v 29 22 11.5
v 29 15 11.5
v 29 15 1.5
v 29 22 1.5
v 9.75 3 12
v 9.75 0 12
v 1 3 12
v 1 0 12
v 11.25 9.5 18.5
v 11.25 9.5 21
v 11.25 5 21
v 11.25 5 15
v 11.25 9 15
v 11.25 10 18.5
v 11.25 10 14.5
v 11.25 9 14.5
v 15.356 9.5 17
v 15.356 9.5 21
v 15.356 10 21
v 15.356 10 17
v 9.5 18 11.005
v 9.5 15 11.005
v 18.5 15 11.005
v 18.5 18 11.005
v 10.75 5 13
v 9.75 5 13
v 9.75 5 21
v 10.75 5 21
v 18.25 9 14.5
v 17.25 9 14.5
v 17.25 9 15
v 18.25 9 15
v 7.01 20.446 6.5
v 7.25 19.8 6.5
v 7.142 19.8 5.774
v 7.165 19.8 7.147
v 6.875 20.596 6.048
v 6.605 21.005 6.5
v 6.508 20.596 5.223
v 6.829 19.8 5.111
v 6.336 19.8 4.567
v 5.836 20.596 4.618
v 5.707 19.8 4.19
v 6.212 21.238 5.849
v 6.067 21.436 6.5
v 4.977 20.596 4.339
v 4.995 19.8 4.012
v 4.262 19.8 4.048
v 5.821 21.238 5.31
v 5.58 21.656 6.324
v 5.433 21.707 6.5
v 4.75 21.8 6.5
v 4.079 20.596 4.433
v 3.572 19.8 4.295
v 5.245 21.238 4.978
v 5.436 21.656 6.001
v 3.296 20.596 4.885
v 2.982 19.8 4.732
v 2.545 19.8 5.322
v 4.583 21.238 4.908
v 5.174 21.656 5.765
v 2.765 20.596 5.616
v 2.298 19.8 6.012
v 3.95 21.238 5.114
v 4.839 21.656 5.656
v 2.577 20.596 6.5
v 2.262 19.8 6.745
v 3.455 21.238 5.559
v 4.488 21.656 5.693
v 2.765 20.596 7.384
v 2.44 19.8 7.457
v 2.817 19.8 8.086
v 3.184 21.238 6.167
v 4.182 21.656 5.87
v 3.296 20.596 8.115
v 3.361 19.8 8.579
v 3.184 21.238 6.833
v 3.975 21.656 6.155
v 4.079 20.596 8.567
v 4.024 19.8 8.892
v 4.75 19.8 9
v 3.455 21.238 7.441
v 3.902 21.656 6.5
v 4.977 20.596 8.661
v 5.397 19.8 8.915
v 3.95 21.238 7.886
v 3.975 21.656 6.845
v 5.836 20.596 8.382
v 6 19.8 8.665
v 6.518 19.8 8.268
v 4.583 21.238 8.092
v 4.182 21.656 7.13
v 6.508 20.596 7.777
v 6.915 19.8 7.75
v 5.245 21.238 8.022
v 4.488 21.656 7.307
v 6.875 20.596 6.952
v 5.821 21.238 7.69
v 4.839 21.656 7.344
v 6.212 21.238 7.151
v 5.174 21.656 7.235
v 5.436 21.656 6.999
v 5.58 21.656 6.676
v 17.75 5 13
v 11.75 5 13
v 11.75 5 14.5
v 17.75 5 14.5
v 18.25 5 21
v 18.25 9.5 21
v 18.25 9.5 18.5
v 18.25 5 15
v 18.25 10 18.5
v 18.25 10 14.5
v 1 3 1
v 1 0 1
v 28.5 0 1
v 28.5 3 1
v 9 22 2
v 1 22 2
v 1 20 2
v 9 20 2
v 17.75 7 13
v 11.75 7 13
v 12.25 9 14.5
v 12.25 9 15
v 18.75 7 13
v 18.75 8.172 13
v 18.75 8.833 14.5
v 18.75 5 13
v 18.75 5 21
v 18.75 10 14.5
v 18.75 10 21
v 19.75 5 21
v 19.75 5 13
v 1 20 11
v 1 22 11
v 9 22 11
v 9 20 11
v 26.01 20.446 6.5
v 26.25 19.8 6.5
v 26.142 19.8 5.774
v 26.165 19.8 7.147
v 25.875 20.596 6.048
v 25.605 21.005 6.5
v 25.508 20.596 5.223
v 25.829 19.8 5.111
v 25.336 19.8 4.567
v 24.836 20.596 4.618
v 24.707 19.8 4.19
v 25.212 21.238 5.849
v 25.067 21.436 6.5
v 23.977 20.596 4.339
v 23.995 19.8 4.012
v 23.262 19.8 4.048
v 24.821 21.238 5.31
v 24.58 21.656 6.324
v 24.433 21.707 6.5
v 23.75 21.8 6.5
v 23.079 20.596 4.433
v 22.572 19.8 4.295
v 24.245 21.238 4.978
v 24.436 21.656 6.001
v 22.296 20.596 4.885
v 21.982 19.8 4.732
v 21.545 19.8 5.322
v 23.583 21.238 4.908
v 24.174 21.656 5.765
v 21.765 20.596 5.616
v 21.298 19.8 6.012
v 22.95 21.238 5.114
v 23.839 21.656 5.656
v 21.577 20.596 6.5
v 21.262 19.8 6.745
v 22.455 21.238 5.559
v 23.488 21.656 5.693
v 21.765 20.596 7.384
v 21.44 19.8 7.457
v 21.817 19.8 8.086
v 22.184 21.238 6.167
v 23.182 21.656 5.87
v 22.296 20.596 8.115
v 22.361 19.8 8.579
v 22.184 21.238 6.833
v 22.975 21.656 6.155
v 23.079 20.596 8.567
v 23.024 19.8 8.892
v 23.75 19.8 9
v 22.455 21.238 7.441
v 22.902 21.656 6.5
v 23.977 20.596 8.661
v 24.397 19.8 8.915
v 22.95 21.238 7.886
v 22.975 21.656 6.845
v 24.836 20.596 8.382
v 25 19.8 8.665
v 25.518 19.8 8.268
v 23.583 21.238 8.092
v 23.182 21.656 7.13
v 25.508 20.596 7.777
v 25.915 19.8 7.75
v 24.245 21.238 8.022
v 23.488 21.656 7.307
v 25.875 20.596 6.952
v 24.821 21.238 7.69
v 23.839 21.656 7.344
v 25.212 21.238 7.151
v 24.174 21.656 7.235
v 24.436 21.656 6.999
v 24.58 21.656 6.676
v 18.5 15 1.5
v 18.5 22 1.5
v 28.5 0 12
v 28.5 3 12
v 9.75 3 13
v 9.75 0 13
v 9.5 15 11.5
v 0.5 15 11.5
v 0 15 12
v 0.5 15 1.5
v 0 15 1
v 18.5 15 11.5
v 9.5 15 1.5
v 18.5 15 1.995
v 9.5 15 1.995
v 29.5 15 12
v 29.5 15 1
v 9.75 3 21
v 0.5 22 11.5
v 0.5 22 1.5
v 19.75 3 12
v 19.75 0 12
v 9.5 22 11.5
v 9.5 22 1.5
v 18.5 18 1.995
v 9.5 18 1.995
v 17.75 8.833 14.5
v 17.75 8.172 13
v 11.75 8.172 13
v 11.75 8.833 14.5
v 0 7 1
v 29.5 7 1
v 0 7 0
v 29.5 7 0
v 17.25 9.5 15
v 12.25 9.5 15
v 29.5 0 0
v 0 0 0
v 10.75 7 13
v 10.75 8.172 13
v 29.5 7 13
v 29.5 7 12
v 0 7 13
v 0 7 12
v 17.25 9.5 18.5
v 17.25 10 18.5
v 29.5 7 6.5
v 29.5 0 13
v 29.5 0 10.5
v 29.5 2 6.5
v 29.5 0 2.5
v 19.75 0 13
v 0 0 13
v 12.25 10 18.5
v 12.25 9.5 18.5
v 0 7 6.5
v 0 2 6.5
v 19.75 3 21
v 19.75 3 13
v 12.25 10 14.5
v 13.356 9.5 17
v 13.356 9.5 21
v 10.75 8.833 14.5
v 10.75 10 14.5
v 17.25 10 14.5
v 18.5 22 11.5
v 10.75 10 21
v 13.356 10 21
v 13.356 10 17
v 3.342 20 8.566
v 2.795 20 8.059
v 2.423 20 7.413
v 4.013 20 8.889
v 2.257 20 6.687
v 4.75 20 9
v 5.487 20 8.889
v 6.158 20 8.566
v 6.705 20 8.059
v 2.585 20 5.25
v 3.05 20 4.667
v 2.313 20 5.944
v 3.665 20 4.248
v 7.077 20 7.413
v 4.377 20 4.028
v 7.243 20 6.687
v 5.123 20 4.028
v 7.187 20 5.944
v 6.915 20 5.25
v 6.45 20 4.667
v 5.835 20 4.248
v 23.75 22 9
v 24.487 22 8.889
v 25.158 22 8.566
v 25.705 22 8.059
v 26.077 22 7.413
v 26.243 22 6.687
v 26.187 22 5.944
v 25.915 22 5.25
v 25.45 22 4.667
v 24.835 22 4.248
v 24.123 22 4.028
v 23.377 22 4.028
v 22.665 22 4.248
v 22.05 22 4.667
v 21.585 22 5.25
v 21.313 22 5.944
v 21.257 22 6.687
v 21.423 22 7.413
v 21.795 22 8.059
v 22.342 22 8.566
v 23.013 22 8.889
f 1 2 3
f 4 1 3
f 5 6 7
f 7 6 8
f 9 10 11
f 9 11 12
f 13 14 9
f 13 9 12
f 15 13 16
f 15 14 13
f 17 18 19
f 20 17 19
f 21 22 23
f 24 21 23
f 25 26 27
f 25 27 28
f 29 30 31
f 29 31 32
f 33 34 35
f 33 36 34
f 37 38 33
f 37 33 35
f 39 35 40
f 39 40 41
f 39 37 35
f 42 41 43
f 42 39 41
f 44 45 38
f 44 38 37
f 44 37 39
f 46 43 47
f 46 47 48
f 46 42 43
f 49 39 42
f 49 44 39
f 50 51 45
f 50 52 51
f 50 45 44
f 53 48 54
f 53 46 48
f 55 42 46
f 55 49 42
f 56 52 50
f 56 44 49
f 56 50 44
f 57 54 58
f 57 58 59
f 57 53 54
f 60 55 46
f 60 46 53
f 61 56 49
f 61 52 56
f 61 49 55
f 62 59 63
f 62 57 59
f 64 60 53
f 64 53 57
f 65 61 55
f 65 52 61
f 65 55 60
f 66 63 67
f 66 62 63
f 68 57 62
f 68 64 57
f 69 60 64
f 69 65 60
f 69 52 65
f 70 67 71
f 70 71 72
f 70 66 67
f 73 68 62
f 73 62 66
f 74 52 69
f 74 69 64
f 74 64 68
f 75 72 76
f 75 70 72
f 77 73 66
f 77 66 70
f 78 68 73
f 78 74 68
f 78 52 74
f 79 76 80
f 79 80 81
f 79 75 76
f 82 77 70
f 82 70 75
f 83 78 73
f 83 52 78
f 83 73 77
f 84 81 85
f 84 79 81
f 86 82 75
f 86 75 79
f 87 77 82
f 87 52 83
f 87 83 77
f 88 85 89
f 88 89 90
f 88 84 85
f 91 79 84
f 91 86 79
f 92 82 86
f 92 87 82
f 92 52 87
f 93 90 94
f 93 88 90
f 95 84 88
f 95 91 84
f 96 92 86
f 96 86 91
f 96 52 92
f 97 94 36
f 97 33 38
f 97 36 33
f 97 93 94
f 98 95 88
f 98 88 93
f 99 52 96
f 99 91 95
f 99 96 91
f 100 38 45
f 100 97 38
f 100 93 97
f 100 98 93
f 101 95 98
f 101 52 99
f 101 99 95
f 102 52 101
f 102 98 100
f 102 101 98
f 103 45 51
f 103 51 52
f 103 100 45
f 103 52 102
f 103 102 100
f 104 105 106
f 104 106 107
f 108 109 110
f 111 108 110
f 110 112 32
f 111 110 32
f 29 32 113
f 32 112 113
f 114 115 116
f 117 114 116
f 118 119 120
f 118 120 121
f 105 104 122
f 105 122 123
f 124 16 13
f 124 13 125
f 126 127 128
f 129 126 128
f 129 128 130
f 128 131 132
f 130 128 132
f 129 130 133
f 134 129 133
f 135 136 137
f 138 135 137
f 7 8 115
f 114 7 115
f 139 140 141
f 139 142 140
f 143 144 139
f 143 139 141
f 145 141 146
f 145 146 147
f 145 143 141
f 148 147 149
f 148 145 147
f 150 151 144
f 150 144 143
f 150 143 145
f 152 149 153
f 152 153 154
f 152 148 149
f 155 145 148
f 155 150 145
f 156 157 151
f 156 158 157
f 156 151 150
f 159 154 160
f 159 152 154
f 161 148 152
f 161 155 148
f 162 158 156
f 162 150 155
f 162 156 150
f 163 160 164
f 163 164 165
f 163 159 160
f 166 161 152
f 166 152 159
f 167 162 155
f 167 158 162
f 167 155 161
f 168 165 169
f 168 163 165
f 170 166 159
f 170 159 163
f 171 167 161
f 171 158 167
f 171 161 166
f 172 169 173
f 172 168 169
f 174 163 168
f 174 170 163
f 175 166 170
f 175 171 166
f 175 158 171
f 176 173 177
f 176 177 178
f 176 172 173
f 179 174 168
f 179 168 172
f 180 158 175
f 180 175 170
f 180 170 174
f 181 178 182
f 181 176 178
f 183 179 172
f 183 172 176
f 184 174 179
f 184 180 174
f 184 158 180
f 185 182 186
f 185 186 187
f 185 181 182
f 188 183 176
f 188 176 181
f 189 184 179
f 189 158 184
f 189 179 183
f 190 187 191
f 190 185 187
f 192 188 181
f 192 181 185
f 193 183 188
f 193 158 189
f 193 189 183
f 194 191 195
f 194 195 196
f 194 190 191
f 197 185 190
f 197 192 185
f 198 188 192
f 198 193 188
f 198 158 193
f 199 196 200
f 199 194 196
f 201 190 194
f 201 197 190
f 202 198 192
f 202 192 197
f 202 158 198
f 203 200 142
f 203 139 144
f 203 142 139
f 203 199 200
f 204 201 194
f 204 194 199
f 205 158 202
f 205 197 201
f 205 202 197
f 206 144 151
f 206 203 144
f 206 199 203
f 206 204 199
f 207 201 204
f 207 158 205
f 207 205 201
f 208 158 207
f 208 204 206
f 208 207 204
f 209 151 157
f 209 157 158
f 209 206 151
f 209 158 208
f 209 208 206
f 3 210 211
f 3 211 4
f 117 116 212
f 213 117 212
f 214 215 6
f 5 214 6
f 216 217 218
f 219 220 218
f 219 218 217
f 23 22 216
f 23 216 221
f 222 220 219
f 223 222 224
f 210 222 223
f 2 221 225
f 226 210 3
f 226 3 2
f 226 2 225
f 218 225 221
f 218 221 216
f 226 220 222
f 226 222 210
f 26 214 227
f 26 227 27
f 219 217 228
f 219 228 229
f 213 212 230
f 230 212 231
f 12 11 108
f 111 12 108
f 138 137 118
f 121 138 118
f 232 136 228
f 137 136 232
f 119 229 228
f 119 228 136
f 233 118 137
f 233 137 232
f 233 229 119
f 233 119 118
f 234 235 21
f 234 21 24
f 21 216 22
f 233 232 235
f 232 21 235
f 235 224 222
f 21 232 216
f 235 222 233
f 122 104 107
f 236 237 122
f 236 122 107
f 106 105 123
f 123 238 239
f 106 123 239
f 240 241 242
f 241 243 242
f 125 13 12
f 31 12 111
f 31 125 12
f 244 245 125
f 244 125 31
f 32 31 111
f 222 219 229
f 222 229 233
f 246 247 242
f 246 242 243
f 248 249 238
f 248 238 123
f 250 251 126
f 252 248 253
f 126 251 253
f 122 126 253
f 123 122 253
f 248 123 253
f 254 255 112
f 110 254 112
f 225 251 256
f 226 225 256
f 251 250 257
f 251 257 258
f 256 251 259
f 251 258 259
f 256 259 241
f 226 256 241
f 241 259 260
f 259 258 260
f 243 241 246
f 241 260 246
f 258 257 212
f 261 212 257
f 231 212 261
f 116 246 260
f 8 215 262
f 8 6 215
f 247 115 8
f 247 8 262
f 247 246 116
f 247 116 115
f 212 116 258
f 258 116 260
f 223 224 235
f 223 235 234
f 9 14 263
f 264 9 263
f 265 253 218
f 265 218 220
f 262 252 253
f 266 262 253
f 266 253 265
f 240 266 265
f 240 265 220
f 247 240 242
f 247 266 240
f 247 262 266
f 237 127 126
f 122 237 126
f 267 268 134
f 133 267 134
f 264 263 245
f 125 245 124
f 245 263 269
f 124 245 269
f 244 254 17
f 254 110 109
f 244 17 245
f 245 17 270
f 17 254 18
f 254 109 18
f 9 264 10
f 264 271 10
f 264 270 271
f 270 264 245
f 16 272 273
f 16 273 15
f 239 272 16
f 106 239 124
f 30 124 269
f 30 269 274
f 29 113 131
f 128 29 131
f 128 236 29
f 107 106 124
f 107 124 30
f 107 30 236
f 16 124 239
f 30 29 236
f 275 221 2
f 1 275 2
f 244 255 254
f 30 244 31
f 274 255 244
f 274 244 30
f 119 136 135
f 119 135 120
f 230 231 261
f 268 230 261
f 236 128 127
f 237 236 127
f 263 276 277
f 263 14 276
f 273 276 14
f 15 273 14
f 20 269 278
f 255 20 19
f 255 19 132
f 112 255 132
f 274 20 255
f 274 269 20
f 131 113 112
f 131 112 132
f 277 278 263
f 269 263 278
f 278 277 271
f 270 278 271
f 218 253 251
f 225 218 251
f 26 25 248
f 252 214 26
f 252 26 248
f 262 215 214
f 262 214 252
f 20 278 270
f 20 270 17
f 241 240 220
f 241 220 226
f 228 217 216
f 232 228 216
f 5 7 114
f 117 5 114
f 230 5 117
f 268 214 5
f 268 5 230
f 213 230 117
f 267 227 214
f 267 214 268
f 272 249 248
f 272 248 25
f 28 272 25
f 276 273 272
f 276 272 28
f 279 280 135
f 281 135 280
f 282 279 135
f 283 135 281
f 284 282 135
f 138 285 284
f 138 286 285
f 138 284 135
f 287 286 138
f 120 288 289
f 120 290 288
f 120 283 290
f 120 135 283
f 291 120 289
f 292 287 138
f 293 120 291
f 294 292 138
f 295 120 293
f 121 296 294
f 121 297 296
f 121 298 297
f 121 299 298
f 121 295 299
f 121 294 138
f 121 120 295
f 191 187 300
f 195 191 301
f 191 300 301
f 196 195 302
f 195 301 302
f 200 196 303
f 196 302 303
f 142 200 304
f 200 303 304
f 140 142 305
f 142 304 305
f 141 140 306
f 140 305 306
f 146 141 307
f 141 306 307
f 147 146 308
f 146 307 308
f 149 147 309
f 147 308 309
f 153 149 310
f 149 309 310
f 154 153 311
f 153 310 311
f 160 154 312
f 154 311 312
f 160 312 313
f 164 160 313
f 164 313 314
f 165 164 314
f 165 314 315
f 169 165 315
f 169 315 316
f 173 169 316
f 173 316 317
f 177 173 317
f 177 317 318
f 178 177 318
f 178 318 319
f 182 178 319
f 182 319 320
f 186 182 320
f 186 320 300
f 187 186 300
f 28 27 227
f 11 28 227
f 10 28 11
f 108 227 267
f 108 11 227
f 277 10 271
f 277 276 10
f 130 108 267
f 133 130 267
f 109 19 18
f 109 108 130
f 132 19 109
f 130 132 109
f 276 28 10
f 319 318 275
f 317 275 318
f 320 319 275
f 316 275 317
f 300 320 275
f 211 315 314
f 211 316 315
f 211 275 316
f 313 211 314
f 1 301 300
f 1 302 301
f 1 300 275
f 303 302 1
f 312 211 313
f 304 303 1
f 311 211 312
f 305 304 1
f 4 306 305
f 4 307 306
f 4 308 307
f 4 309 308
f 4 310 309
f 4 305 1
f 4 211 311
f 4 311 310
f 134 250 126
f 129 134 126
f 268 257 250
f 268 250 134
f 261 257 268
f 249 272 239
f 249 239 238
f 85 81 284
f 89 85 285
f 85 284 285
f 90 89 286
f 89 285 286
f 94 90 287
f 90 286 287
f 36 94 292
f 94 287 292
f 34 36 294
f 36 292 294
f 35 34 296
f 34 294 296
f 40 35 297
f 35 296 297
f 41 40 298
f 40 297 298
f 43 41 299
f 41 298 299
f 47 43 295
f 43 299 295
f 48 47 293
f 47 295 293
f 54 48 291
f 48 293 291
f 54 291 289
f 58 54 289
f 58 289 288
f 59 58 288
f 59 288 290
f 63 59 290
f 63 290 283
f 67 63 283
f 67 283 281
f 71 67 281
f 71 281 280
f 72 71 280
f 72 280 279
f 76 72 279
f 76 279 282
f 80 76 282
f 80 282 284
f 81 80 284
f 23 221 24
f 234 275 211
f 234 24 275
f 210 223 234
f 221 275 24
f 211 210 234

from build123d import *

# Parameters (mm, degrees)
EXTRUDE_1_DEPTH          = 7
CUT_EXTRUDE_START        = -5
SKETCH_2_R               = 4
CUT_EXTRUDE_1_DEPTH      = 5
SKETCH_3_W               = 29.5
SKETCH_3_H               = 11
EXTRUDE_2_DEPTH          = 8
SKETCH_4_W               = 10.5
SKETCH_4_H               = 10
SKETCH_4_W_2             = 9
EXTRUDE_3_DEPTH          = 7
SKETCH_5_W               = 8
SKETCH_5_H               = 9
CUT_EXTRUDE_2_DEPTH      = 2
SKETCH_6_R               = 2.5
CUT_EXTRUDE_3_DEPTH      = 2.2
SKETCH_7_R               = 1.6
CUT_EXTRUDE_4_DEPTH      = 45.443784717
SKETCH_8_W               = 10
SKETCH_8_H               = 5
EXTRUDE_4_DEPTH          = 8
CUT_EXTRUDE_5_DEPTH      = 3
SKETCH_11_W              = 8
SKETCH_11_H              = 6.5
EXTRUDE_6_DEPTH          = 5
EXTRUDE_7_DEPTH          = 1
EXTRUDE_8_DEPTH          = 1
CUT_EXTRUDE_6_DEPTH      = 4
SKETCH_15_W              = 7
SKETCH_15_H              = 4.5
CUT_EXTRUDE_7_DEPTH      = 2
SKETCH_16_W              = 1
SKETCH_16_H              = 4
CUT_EXTRUDE_8_DEPTH      = 1
CUT_EXTRUDE_9_DEPTH      = 46.521972716
CUT_EXTRUDE_9_DEPTH_BACK = 46.521972716
SKETCH_17_W              = 8.500817713
SKETCH_17_H              = 8.67771192
SKETCH_17_W_2            = 8.381247082
SKETCH_17_H_2            = 10.001242217
SKETCH_18_W              = 9
SKETCH_18_H              = 9.010392854
EXTRUDE_9_DEPTH          = 3


# Read off the part's stored shape, not the designer's step: 圆顶1, 圆顶2
with BuildPart() as part:
    # 草图1 → 凸台-拉伸1 (new body)
    with BuildSketch(Plane(origin=(0, 0, 0), x_dir=(1, 0, 0), z_dir=(0, 1, 0))):
        with BuildLine():
            Line((0, 0), (29.5, 0))
            Line((29.5, 0), (29.5, -2.5))
            Line((29.5, -2.5), (33.5, -2.5))
            ThreePointArc((33.5, -2.5), (37.5, -6.5), (33.5, -10.5))
            Line((33.5, -10.5), (29.5, -10.5))
            Line((29.5, -10.5), (29.5, -13))
            Line((29.5, -13), (0, -13))
            Line((0, -13), (0, -10.5))
            Line((0, -10.5), (-4, -10.5))
            ThreePointArc((-4, -10.5), (-8, -6.5), (-4, -2.5))
            Line((-4, -2.5), (0, -2.5))
            Line((0, -2.5), (0, 0))
        make_face()
    extrude(amount=EXTRUDE_1_DEPTH)

    # 草图2 → 切除-拉伸1 (cut)
    with BuildSketch(Plane(origin=(0, 7, 0), x_dir=(1, 0, 0), z_dir=(0, 1, 0)).offset(CUT_EXTRUDE_START)):
        with Locations((-4, -6.5)):
            Circle(SKETCH_2_R)
        with Locations((33.5, -6.5)):
            Circle(SKETCH_2_R)
    extrude(amount=CUT_EXTRUDE_1_DEPTH, mode=Mode.SUBTRACT)

    # 草图3 → 凸台-拉伸2 (add)
    with BuildSketch(Plane(origin=(0, 7, 0), x_dir=(1, 0, 0), z_dir=(0, 1, 0))):
        with Locations((14.75, -6.5)):
            Rectangle(SKETCH_3_W, SKETCH_3_H)
    extrude(amount=EXTRUDE_2_DEPTH)

    # 草图4 → 凸台-拉伸3 (add)
    with BuildSketch(Plane(origin=(0, 15, 0), x_dir=(1, 0, 0), z_dir=(0, 1, 0))):
        with Locations((23.75, -6.5)):
            Rectangle(SKETCH_4_W, SKETCH_4_H)
        with Locations((5, -6.5)):
            Rectangle(SKETCH_4_W_2, SKETCH_4_H)
    extrude(amount=EXTRUDE_3_DEPTH)

    # 草图5 → 切除-拉伸2 (cut)
    with BuildSketch(Plane(origin=(0, 22, 0), x_dir=(1, 0, 0), z_dir=(0, 1, 0))):
        with Locations((5, -6.5)):
            Rectangle(SKETCH_5_W, SKETCH_5_H)
    extrude(amount=-CUT_EXTRUDE_2_DEPTH, mode=Mode.SUBTRACT)

    # 草图6 → 切除-拉伸3 (cut)
    with BuildSketch(Plane(origin=(0, 22, 0), x_dir=(1, 0, 0), z_dir=(0, 1, 0))):
        with Locations(Location((23.75, -6.5, 0), (0, 0, 270))):
            Circle(SKETCH_6_R)
        with Locations(Location((4.75, -6.5, 0), (0, 0, 270))):
            Circle(SKETCH_6_R)
    extrude(amount=-CUT_EXTRUDE_3_DEPTH, mode=Mode.SUBTRACT)

    # 圆顶1 outline → 圆顶1 (revolve)
    with BuildSketch(Plane(origin=(4.75, 0, 6.5), x_dir=(1, 0, 0), z_dir=(0, 0, 1))):
        with BuildLine():
            Line((0, 19.8), (2.500000001, 19.799999998))
            ThreePointArc((2.500000001, 19.799999998), (1.60078106, 21.238476323), (0, 21.8))
            Line((0, 21.8), (0, 19.8))
        make_face()
    revolve(axis=Axis((4.75, 0, 6.5), (0, 1, 0)))

    # 圆顶2 outline → 圆顶2 (revolve)
    with BuildSketch(Plane(origin=(23.75, 0, 6.5), x_dir=(1, 0, 0), z_dir=(0, 0, 1))):
        with BuildLine():
            Line((0, 19.8), (2.500000001, 19.799999997))
            ThreePointArc((2.500000001, 19.799999997), (1.60078106, 21.238476323), (0, 21.8))
            Line((0, 21.8), (0, 19.8))
        make_face()
    revolve(axis=Axis((23.75, 0, 6.5), (0, 1, 0)))

    # 草图7 → 切除-拉伸4 (cut, through all)
    with BuildSketch(Plane(origin=(0, 2, 0), x_dir=(1, 0, 0), z_dir=(0, 1, 0))):
        with Locations(Location((-4, -6.5, 0), (0, 0, 270))):
            Circle(SKETCH_7_R)
        with Locations(Location((33.5, -6.5, 0), (0, 0, 270))):
            Circle(SKETCH_7_R)
    extrude(amount=-CUT_EXTRUDE_4_DEPTH, mode=Mode.SUBTRACT)

    # 草图8 → 凸台-拉伸4 (add)
    with BuildSketch(Plane.XY.offset(13)):
        with Locations((14.75, 2.5)):
            Rectangle(SKETCH_8_W, SKETCH_8_H)
    extrude(amount=EXTRUDE_4_DEPTH)

    # 草图10 → 切除-拉伸5 (cut)
    with BuildSketch(Plane.XZ):
        Polygon((9.75, 21), (9.75, 12), (1, 12), (1, 1), (28.5, 1), (28.5, 12), (19.75, 12), (19.75, 21), align=None)
    extrude(amount=-CUT_EXTRUDE_5_DEPTH, mode=Mode.SUBTRACT)

    # 草图11 → 凸台-拉伸6 (add)
    with BuildSketch(Plane(origin=(0, 5, 0), x_dir=(1, 0, 0), z_dir=(0, 1, 0))):
        with Locations((14.75, -17.75)):
            Rectangle(SKETCH_11_W, SKETCH_11_H)
    extrude(amount=EXTRUDE_6_DEPTH)

    # 草图12 → 凸台-拉伸7 (add)
    with BuildSketch(Plane(origin=(18.75, 0, 0), x_dir=(0, 0, -1), z_dir=(1, 0, 0))):
        Polygon((-14.5, 8.832927064), (-13, 8.172497524), (-13, 5), (-14.5, 5), align=None)
    extrude(amount=-EXTRUDE_7_DEPTH)

    # 草图13 → 凸台-拉伸8 (add)
    with BuildSketch(Plane.ZY.offset(-10.75)):
        Polygon((14.5, 8.832927064), (13, 8.172497524), (13, 5), (14.5, 5), align=None)
    extrude(amount=-EXTRUDE_8_DEPTH)

    # 草图14 → 切除-拉伸6 (cut)
    with BuildSketch(Plane.XY.offset(21)):
        Polygon((11.25, 5), (18.25, 5), (18.25, 9.5), (15.355989936, 9.5), (15.355989936, 10), (13.355989936, 10), (13.355989936, 9.5), (11.25, 9.5), align=None)
    extrude(amount=-CUT_EXTRUDE_6_DEPTH, mode=Mode.SUBTRACT)

    # 草图15 → 切除-拉伸7 (cut)
    with BuildSketch(Plane.XY.offset(17)):
        with Locations((14.75, 7.25)):
            Rectangle(SKETCH_15_W, SKETCH_15_H)
    extrude(amount=-CUT_EXTRUDE_7_DEPTH, mode=Mode.SUBTRACT)

    # 草图16 → 切除-拉伸8 (cut)
    with BuildSketch(Plane(origin=(0, 10, 0), x_dir=(1, 0, 0), z_dir=(0, 1, 0))):
        with Locations((11.75, -16.5)):
            Rectangle(SKETCH_16_W, SKETCH_16_H)
        with Locations((17.75, -16.5)):
            Rectangle(SKETCH_16_W, SKETCH_16_H)
    extrude(amount=-CUT_EXTRUDE_8_DEPTH, mode=Mode.SUBTRACT)

    # 草图17 → 切除-拉伸9 (cut, two sides: drawn at the far end of the back side and taken through both)
    with BuildSketch(Plane(origin=(0, 15, 0), x_dir=(1, 0, 0), z_dir=(0, 1, 0)).offset(-CUT_EXTRUDE_9_DEPTH_BACK)):
        with Locations((33.750408857, -6.83885596)):
            Rectangle(SKETCH_17_W, SKETCH_17_H)
        with Locations((-4.190623541, -7.500621109)):
            Rectangle(SKETCH_17_W_2, SKETCH_17_H_2)
    extrude(amount=CUT_EXTRUDE_9_DEPTH + CUT_EXTRUDE_9_DEPTH_BACK, mode=Mode.SUBTRACT)

    # 草图18 → 凸台-拉伸9 (add)
    with BuildSketch(Plane(origin=(0, 15, 0), x_dir=(1, 0, 0), z_dir=(0, 1, 0))):
        with Locations((14, -6.5)):
            Rectangle(SKETCH_18_W, SKETCH_18_H)
    extrude(amount=EXTRUDE_9_DEPTH)


solid = part.part
